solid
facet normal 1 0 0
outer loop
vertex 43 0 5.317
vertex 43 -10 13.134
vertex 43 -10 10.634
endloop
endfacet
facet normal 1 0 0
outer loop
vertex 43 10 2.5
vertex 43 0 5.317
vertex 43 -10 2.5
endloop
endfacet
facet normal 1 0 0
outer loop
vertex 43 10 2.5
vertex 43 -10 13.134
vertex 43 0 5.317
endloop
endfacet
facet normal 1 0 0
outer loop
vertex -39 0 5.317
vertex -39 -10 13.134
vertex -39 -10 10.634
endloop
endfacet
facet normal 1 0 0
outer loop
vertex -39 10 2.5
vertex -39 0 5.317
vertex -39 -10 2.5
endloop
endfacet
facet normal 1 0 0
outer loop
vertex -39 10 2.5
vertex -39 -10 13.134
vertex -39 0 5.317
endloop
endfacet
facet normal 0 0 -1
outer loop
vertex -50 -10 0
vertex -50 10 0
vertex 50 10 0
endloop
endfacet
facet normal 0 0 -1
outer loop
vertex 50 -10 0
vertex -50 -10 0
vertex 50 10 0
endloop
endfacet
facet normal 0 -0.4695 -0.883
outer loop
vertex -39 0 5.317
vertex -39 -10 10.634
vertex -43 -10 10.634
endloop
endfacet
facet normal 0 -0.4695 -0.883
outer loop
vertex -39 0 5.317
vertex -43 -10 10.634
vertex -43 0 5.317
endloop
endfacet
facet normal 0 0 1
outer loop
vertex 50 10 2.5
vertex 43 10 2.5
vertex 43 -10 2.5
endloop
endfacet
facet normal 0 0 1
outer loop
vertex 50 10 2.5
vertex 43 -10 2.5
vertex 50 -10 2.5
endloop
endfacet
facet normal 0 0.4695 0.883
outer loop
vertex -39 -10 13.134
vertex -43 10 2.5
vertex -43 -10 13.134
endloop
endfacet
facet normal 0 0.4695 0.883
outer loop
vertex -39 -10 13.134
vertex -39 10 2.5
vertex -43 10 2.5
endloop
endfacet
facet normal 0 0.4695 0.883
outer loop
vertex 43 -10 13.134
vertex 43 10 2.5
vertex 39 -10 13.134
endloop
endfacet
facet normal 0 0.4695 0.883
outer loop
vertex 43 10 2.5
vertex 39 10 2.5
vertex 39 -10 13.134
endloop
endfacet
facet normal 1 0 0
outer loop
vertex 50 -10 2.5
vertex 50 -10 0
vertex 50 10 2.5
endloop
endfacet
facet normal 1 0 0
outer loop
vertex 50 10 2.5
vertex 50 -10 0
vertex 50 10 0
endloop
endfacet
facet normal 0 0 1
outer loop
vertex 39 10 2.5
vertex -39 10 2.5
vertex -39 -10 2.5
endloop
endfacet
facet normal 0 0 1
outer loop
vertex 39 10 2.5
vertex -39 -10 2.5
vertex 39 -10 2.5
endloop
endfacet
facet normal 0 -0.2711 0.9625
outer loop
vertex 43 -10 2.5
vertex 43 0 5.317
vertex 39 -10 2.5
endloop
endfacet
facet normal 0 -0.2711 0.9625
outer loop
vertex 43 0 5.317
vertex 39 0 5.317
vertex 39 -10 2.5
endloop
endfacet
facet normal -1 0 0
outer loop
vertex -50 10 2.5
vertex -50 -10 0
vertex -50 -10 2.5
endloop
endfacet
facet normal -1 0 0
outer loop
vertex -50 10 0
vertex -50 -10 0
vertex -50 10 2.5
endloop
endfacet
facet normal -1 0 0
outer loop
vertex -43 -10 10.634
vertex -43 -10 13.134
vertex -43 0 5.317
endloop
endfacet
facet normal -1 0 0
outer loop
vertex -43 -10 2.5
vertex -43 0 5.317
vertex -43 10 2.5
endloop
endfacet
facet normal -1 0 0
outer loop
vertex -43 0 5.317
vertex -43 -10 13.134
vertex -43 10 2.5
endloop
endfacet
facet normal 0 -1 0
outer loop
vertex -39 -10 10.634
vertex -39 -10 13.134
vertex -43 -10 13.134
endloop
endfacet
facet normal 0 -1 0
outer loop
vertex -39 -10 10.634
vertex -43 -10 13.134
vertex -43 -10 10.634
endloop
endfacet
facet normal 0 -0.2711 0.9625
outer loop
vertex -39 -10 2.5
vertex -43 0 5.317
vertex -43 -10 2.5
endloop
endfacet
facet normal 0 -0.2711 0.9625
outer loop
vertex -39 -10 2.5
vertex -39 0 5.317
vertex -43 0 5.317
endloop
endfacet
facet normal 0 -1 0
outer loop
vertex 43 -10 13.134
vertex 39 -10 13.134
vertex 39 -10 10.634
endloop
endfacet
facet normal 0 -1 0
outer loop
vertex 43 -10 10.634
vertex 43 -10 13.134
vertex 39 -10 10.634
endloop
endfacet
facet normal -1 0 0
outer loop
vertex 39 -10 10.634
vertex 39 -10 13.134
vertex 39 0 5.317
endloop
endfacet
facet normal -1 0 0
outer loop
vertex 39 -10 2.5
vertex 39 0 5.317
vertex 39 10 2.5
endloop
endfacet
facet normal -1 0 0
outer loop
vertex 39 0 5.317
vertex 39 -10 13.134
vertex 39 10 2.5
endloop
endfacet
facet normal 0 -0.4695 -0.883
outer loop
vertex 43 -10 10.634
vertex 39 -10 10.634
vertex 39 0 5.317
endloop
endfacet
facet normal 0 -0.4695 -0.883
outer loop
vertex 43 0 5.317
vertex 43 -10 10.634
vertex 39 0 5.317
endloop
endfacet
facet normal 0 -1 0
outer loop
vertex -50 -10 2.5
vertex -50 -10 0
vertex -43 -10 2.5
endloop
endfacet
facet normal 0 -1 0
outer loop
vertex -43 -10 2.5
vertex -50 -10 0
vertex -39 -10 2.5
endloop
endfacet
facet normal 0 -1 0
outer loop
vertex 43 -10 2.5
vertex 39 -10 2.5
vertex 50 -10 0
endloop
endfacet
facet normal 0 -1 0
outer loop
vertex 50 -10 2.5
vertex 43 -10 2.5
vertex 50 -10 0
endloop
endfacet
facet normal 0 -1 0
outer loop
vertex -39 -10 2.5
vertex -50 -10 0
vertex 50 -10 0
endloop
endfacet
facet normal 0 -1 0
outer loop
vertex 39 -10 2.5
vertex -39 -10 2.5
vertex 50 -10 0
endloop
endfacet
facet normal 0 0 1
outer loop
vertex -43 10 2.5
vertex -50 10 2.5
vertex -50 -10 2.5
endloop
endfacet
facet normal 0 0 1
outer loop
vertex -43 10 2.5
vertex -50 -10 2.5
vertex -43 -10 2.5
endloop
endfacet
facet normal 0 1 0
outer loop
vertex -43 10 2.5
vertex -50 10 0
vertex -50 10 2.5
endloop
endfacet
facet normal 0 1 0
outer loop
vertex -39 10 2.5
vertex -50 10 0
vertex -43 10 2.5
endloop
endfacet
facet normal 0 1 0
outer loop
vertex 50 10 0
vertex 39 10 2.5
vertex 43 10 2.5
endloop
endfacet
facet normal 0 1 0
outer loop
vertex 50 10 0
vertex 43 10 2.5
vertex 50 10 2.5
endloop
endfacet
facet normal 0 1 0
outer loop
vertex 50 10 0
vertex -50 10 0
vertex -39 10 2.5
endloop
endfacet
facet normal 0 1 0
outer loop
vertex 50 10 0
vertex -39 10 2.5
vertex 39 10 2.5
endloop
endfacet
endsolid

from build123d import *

# Parameters (mm, degrees)
SKETCH_W     = 100
SKETCH_H     = 20
PAD_DEPTH    = 2.5
PAD001_DEPTH = 2


with BuildPart() as part:
    # Sketch → Pad (new body)
    with BuildSketch(Plane.XY):
        Rectangle(SKETCH_W, SKETCH_H)
    extrude(amount=PAD_DEPTH)

    # Sketch002 (on DatumPlane) → Pad001 (join, symmetric)
    with BuildSketch(Plane.YZ.offset(-41)):
        Polygon((10, 2.5), (-10, 13.134189), (-10, 10.634189), (0, 5.317094), (-10, 2.5), align=None)
    pad001 = extrude(amount=PAD001_DEPTH, both=True)

    # Mirrored: Pad001 across YZ
    add(pad001.mirror(Plane.YZ))


solid = part.part
